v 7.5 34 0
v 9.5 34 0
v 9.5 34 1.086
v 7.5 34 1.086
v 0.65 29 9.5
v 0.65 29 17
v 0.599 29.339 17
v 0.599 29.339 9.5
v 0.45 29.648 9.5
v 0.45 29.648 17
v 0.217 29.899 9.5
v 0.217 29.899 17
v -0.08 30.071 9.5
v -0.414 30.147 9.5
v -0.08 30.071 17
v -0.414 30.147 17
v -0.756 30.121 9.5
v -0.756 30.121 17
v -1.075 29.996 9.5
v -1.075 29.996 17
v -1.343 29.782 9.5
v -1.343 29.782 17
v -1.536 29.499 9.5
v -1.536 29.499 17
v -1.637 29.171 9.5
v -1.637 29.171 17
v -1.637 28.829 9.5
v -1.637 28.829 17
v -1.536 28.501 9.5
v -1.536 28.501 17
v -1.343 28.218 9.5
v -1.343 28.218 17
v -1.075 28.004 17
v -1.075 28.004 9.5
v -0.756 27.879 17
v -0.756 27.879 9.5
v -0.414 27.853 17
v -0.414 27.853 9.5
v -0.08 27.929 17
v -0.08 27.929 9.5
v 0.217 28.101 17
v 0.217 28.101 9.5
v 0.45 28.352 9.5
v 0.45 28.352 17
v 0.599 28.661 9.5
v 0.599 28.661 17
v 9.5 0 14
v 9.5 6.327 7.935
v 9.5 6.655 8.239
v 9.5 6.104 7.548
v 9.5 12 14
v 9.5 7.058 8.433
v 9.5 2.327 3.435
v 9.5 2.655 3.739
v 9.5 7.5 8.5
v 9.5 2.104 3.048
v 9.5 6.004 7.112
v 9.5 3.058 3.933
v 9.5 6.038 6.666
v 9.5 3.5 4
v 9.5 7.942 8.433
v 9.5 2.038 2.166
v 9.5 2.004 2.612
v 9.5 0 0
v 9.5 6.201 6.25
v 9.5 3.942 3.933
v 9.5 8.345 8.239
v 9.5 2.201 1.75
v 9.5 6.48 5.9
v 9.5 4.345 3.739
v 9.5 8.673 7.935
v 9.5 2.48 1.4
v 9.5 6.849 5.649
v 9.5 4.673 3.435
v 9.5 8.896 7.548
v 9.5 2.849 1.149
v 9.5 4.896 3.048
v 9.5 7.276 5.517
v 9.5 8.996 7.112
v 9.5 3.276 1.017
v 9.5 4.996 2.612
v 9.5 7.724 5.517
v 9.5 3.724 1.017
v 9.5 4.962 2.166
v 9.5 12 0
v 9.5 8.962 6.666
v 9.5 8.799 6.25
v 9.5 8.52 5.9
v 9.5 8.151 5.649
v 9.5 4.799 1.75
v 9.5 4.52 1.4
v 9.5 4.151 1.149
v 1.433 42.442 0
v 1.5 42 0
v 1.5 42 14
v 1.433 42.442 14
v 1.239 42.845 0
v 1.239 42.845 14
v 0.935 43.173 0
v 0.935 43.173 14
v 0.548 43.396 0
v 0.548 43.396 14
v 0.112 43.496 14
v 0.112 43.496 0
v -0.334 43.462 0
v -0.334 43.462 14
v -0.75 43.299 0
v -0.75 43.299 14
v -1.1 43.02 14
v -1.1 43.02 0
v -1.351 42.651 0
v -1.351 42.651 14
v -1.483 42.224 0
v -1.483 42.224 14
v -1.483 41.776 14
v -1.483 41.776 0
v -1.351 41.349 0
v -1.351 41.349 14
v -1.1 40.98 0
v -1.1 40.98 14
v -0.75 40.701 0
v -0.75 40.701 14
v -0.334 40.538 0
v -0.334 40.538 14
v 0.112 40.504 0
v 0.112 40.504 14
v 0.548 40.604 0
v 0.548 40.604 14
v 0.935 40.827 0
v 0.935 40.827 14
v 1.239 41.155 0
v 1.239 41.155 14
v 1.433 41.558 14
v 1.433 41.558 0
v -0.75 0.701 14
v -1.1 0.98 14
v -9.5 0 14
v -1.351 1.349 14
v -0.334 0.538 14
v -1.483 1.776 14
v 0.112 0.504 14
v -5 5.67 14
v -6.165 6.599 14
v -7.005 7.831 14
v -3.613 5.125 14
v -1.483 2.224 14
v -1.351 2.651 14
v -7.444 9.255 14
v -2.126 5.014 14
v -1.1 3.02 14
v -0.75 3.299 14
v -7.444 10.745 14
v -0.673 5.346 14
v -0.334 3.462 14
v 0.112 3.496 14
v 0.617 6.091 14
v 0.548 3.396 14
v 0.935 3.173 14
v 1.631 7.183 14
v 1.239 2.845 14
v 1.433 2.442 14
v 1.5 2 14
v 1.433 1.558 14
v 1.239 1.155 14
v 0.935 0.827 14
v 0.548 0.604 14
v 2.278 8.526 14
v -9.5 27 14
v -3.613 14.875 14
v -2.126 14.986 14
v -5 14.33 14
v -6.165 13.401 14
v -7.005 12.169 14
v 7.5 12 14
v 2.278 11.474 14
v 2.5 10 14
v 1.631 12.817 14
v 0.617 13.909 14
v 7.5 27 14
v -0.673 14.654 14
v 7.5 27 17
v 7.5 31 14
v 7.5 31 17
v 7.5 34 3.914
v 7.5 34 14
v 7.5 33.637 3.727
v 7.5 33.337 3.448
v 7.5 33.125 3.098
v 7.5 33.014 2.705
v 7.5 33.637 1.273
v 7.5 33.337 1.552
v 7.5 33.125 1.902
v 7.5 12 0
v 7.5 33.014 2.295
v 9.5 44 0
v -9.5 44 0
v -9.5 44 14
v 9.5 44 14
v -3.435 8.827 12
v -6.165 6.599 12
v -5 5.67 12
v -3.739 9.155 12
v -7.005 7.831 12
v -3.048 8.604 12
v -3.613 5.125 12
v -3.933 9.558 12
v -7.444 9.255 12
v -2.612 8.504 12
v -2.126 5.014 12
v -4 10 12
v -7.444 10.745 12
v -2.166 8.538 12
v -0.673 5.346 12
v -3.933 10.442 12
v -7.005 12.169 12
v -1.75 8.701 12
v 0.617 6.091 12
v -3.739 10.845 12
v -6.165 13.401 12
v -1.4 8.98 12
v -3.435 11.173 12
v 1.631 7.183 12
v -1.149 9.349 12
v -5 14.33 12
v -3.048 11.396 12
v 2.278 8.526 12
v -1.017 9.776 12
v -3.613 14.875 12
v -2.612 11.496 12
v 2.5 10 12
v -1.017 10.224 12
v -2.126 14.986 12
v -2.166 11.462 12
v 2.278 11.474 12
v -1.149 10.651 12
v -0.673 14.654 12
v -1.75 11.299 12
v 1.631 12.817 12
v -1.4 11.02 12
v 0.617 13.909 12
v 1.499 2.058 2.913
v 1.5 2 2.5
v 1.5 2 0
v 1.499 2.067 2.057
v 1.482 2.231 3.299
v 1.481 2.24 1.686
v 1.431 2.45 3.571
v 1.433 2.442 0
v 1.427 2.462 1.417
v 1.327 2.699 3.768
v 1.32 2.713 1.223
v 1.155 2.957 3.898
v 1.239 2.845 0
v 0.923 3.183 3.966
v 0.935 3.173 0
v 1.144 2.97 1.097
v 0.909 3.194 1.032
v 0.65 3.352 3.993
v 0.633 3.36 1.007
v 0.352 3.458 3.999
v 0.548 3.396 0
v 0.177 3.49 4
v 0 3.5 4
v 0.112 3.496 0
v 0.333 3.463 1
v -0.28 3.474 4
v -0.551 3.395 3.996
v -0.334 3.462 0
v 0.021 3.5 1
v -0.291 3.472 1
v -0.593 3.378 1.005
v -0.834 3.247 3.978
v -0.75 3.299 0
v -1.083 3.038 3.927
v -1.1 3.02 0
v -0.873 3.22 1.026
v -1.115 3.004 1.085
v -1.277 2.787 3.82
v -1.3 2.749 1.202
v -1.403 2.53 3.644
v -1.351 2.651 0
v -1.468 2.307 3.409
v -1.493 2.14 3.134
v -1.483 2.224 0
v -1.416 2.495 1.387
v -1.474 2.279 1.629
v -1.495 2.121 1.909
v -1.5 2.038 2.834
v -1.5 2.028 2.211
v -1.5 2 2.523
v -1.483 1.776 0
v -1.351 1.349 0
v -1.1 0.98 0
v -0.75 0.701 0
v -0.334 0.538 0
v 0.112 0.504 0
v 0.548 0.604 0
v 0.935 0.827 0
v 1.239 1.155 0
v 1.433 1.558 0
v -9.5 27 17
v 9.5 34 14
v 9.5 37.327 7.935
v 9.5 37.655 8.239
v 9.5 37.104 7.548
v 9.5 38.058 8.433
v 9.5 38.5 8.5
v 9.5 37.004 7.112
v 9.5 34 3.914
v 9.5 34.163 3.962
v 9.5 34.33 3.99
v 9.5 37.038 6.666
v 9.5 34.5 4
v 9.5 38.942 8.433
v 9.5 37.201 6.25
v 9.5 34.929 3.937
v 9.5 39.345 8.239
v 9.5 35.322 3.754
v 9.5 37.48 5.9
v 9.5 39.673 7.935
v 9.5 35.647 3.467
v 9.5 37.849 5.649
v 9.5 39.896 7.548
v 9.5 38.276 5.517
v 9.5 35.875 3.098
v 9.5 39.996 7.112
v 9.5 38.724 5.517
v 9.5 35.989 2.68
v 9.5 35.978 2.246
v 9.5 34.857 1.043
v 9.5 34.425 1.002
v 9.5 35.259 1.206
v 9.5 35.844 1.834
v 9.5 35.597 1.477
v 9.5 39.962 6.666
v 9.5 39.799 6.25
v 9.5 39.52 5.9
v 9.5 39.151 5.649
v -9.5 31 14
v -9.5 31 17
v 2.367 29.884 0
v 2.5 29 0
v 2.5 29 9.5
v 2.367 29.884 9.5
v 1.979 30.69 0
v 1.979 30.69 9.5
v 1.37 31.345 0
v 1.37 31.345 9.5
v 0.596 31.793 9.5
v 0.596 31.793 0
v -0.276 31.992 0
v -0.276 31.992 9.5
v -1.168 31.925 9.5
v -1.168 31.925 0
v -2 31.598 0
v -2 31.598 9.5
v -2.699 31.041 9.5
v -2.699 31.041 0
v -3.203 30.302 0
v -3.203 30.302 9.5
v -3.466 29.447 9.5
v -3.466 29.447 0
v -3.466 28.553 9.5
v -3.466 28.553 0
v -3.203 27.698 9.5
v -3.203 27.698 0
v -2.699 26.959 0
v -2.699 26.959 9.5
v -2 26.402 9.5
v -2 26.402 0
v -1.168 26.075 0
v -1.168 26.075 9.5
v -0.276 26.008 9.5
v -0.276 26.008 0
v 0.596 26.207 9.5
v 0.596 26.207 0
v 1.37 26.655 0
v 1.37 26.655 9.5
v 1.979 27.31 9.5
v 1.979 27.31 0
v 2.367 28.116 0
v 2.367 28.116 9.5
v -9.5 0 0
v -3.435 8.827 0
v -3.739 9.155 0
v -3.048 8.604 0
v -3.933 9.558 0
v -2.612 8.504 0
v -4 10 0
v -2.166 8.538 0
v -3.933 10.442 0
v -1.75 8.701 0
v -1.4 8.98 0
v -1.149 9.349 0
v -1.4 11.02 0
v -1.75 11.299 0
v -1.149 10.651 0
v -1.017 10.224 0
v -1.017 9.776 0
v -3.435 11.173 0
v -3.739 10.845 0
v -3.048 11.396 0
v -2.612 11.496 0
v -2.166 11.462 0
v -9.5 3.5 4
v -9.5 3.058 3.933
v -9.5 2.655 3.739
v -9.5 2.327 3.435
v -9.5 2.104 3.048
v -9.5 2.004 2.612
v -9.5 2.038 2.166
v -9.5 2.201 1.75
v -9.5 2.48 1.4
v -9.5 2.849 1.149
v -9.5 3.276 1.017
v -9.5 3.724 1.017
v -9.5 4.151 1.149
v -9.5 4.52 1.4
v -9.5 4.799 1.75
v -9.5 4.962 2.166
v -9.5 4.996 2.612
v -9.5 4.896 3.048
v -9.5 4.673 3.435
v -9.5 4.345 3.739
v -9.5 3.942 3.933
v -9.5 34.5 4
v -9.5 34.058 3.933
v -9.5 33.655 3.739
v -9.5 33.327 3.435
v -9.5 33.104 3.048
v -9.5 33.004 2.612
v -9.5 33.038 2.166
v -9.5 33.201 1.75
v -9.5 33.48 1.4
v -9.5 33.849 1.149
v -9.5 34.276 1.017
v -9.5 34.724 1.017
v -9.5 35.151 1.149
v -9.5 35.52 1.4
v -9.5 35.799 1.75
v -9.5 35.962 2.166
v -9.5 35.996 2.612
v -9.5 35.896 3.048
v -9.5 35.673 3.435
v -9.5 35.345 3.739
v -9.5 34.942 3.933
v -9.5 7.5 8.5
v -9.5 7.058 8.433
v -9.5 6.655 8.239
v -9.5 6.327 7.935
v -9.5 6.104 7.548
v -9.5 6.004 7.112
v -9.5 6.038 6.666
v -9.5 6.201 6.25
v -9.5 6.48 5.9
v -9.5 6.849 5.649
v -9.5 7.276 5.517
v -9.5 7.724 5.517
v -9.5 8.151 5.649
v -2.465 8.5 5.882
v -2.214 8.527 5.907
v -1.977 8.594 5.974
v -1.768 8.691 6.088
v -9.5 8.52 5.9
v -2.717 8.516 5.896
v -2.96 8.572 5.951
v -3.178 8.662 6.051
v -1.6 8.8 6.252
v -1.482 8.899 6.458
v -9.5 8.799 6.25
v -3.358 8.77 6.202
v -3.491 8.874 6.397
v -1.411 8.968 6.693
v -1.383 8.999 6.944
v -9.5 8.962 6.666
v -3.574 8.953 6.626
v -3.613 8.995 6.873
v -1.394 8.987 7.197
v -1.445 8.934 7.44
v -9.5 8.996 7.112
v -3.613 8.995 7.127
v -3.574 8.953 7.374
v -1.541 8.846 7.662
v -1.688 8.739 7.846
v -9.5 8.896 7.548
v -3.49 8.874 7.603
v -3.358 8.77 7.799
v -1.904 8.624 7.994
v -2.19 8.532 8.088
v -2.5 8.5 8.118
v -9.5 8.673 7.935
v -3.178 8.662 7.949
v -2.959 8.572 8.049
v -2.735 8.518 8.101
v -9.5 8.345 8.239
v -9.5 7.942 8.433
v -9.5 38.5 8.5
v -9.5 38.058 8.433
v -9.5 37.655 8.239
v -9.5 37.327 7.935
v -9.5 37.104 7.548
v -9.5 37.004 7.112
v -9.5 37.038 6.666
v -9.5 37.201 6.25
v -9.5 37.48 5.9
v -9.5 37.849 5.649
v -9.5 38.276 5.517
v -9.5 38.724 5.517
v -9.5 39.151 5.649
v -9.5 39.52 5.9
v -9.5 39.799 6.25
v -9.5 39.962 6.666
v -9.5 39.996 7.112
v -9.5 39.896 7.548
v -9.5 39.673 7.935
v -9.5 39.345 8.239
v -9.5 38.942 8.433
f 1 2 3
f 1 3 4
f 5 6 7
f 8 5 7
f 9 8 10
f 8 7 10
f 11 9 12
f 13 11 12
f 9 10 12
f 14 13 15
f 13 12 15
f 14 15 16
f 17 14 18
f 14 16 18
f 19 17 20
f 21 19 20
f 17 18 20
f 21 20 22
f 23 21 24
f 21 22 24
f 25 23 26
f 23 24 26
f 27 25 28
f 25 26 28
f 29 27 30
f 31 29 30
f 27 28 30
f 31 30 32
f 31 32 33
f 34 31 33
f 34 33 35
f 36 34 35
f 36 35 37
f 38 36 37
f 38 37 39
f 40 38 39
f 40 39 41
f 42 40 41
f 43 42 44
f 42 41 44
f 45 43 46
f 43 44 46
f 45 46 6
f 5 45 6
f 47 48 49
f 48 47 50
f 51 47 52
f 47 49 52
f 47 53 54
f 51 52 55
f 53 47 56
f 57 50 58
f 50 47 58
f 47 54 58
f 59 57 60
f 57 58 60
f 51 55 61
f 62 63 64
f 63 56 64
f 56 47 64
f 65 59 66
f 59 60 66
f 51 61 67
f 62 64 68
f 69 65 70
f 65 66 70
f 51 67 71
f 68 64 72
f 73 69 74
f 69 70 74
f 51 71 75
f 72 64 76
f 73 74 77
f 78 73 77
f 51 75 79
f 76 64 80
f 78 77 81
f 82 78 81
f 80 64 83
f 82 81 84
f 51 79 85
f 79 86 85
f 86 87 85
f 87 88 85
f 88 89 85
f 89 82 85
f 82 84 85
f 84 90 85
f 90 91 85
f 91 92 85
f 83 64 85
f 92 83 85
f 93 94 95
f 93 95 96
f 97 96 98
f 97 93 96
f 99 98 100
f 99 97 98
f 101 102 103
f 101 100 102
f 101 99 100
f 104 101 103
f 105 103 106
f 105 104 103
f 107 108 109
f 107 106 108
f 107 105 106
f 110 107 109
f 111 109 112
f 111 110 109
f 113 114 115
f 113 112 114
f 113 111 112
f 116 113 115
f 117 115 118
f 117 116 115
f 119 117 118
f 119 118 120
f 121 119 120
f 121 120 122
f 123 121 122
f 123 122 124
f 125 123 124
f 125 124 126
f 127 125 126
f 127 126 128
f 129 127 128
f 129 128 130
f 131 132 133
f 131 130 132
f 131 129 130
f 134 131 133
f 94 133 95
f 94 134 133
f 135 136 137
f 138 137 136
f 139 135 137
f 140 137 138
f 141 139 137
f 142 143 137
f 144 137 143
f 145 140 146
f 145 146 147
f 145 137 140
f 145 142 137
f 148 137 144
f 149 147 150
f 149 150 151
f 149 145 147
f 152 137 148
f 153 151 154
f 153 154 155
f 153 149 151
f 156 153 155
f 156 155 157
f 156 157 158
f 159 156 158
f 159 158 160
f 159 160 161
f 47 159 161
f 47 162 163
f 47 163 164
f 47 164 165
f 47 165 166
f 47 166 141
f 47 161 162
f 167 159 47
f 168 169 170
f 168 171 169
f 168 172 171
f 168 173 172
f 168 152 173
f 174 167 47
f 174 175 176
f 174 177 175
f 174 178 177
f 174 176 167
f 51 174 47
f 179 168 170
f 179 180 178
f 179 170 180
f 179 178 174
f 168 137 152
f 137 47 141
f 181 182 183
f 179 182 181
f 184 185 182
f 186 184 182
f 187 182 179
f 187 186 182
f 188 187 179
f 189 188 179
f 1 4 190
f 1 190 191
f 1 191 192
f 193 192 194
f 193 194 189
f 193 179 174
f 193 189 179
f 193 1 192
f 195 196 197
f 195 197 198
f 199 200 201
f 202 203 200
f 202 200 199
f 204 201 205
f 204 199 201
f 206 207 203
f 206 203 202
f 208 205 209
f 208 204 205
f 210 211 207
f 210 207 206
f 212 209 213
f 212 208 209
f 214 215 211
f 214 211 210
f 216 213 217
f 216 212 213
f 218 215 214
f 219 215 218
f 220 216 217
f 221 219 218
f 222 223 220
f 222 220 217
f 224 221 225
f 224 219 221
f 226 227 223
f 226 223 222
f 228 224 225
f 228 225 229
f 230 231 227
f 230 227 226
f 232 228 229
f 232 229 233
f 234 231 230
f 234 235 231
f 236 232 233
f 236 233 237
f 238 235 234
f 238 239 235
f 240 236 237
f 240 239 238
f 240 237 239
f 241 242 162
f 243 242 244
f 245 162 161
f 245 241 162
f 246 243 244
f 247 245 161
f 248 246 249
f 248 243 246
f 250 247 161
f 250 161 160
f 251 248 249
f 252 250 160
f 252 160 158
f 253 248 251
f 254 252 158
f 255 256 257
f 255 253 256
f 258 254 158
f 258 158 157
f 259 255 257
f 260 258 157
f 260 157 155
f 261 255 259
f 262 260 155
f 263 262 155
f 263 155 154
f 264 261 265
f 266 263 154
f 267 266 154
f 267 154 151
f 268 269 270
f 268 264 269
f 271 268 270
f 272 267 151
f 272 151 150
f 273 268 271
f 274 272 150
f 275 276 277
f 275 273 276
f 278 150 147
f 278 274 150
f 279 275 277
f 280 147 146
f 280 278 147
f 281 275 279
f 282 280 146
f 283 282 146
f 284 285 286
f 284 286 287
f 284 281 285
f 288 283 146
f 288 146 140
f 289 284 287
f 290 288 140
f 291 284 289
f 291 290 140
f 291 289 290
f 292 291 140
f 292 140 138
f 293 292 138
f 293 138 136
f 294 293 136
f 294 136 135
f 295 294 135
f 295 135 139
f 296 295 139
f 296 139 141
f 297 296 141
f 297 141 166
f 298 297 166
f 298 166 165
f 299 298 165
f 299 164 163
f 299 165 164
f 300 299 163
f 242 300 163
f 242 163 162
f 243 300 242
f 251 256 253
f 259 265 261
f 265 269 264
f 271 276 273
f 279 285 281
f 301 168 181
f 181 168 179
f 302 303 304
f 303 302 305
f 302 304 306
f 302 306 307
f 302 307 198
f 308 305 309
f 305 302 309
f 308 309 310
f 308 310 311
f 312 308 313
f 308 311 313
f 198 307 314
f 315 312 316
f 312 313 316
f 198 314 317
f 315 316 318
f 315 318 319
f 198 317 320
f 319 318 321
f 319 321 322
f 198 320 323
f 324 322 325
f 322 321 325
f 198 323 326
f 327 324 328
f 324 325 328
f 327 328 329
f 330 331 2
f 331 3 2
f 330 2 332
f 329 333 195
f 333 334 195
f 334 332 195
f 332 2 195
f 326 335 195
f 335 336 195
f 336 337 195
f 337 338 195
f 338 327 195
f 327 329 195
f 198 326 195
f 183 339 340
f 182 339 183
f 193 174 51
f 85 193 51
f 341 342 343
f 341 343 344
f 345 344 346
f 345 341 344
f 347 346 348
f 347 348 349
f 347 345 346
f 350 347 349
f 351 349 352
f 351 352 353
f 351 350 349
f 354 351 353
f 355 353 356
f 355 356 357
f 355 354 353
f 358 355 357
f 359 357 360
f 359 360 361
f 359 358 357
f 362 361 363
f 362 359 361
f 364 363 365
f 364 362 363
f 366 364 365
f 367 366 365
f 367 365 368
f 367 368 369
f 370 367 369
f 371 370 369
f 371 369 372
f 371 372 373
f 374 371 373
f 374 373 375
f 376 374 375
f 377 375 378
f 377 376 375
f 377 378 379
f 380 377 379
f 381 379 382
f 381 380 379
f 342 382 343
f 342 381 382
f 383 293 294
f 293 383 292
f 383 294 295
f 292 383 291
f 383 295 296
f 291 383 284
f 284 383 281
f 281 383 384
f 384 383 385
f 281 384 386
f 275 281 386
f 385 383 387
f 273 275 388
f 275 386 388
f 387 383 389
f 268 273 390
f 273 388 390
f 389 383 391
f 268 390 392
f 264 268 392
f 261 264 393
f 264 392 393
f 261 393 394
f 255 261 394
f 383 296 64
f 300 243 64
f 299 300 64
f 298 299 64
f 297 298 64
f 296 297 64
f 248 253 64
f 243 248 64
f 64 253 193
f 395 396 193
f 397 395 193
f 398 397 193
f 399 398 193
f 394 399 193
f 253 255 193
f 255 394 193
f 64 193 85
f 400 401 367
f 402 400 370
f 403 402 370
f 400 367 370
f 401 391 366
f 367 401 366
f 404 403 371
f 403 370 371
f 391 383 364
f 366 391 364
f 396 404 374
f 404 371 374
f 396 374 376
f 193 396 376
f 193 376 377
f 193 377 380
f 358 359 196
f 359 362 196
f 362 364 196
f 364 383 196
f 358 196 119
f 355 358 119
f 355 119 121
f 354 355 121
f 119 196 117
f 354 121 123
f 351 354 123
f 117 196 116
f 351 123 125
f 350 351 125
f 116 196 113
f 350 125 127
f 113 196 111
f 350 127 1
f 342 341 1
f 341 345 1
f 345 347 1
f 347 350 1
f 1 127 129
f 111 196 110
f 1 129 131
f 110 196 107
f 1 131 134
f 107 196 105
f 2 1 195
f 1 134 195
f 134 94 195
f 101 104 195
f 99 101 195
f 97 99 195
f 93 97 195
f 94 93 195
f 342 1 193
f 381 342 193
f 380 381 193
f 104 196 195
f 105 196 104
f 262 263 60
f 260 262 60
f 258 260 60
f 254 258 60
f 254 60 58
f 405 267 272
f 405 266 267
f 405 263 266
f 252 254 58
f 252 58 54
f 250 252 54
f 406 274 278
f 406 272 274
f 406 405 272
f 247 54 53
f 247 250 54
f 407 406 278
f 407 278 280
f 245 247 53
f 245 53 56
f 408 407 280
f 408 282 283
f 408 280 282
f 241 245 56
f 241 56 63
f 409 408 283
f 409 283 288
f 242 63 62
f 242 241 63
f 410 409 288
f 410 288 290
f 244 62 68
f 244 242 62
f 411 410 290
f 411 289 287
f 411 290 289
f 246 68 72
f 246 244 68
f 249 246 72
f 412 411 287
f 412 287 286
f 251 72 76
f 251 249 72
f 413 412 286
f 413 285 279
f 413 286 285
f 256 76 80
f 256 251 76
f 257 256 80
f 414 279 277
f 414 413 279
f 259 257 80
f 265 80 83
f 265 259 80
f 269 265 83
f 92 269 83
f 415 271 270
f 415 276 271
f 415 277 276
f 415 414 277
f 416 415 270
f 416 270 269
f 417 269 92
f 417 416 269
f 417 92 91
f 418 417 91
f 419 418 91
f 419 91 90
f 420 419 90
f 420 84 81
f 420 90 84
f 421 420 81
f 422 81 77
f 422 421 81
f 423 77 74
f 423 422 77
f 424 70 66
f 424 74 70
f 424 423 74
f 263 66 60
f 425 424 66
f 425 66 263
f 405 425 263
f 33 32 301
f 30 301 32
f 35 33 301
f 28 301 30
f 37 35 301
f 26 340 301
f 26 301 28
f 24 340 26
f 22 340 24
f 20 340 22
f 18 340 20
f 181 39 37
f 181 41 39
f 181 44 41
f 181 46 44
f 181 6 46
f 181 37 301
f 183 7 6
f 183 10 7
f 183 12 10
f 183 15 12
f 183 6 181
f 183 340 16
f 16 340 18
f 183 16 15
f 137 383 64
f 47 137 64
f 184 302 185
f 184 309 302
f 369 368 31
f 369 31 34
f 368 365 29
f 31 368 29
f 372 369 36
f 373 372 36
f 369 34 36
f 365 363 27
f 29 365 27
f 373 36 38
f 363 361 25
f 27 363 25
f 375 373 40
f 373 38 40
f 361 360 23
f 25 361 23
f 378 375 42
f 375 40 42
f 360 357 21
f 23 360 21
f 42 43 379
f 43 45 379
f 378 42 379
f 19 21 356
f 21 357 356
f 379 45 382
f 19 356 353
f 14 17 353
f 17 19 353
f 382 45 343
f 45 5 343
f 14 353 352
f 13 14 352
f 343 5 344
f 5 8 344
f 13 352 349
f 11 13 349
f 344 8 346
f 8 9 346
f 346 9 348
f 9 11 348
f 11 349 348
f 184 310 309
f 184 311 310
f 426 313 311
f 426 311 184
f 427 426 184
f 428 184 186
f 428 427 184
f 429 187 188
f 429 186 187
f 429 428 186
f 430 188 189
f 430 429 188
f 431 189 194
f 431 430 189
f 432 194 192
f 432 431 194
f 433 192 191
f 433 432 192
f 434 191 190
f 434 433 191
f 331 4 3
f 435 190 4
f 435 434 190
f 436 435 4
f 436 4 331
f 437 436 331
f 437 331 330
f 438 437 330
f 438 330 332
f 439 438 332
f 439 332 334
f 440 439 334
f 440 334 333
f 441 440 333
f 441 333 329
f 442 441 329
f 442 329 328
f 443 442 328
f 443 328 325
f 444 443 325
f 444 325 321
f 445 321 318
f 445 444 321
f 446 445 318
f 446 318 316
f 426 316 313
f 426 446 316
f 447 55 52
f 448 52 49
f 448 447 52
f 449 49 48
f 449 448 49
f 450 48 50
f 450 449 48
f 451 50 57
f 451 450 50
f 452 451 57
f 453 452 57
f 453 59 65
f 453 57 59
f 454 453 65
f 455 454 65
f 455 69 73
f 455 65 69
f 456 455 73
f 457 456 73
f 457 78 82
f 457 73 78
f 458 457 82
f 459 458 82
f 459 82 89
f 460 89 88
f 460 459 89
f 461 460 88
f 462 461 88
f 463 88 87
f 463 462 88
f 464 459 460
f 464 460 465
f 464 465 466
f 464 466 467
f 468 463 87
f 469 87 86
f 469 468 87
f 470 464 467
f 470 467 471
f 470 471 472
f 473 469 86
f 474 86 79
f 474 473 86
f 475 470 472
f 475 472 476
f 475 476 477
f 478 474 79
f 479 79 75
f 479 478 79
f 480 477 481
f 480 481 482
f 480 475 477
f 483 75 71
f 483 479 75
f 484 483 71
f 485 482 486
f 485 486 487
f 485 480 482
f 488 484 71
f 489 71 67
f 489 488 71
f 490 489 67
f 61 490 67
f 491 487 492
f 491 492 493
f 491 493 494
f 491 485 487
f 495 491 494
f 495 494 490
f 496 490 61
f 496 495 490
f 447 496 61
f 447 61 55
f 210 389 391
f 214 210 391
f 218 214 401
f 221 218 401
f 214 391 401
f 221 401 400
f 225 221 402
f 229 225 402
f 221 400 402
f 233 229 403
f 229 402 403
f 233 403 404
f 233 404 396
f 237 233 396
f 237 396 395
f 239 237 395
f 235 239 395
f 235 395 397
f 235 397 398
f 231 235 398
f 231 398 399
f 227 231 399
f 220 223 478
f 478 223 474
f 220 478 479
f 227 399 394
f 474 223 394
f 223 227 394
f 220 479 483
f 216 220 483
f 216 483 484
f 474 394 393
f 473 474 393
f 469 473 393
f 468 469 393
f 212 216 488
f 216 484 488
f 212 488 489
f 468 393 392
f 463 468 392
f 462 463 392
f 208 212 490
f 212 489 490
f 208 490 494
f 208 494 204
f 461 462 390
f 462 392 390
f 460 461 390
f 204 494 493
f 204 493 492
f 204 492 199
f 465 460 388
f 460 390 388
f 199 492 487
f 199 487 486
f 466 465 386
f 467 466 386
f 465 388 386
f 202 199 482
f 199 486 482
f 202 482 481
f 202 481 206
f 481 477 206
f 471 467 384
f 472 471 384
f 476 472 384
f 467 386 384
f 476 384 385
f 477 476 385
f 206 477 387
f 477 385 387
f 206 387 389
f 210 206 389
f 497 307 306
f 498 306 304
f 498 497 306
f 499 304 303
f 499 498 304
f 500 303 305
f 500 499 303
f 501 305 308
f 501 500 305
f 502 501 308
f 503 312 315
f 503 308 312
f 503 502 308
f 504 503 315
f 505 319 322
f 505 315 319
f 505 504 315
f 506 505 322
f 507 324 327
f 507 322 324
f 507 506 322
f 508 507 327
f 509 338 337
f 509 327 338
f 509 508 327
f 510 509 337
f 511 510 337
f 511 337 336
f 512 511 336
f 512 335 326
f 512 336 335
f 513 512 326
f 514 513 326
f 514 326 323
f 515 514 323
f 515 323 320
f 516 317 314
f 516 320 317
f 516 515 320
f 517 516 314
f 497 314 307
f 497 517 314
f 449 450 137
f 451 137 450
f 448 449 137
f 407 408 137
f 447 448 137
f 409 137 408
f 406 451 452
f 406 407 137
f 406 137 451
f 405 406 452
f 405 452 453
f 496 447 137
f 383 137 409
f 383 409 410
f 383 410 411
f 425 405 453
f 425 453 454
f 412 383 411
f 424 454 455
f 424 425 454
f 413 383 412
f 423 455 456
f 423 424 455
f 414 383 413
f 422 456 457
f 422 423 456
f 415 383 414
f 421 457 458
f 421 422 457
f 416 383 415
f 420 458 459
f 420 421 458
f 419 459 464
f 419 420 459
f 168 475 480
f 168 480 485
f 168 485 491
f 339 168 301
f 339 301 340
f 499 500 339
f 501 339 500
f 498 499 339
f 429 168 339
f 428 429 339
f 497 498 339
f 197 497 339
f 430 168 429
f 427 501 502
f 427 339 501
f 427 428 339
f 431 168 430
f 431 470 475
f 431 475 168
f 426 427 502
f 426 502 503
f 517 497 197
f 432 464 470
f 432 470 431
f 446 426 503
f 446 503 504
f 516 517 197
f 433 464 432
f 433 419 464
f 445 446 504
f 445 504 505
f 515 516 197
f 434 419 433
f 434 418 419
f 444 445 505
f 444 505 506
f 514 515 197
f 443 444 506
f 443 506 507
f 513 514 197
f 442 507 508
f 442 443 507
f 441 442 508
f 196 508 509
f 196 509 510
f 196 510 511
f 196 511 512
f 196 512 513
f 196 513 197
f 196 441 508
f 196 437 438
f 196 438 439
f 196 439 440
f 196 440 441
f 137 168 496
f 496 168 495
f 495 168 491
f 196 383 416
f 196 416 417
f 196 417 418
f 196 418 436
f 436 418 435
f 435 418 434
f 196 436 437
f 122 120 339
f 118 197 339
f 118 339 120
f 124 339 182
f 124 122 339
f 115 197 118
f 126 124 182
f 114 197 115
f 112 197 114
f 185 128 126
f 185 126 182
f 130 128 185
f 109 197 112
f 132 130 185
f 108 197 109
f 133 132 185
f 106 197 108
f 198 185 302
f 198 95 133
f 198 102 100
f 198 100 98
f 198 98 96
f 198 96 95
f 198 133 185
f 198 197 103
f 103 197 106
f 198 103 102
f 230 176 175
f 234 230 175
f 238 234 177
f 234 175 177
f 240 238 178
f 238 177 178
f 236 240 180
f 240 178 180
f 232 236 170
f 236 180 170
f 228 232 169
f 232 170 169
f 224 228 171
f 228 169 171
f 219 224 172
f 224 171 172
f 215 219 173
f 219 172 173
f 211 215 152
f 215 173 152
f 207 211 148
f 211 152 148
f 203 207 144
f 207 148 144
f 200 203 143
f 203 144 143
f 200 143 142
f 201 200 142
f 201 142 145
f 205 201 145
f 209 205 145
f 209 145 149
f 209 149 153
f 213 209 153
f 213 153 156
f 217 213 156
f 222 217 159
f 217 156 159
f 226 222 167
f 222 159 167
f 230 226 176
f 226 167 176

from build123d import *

# Parameters (mm, degrees)
SKETCH1_W               = 19
SKETCH1_H               = 44
BOSS_EXTRUDE1_DEPTH     = 14
CUT_EXTRUDE1_DEPTH      = 48.140746706
CUT_EXTRUDE1_DEPTH_BACK = 48.140746706
SKETCH2_R               = 1.5
CUT_EXTRUDE2_START      = -9.5
SKETCH3_R               = 1.5
CUT_EXTRUDE2_DEPTH      = 20
BOSS_EXTRUDE2_START     = 14
SKETCH4_W               = 19
SKETCH4_H               = 4
BOSS_EXTRUDE2_DEPTH     = 3
CUT_EXTRUDE3_START      = 17
SKETCH5_R               = 1.15
CUT_EXTRUDE3_DEPTH      = 7.5
SKETCH6_R               = 3
CUT_EXTRUDE4_DEPTH      = 9.5
CUT_EXTRUDE5_DEPTH      = 49.117044817
CUT_EXTRUDE5_DEPTH_BACK = 49.117044817
SKETCH8_R               = 1.5
CUT_EXTRUDE6_DEPTH      = 36
SKETCH9_R               = 5
CUT_EXTRUDE7_DEPTH      = 2


with BuildPart() as part:
    # Sketch1 → Boss-Extrude1 (new body)
    with BuildSketch(Plane.XY):
        with Locations((0, 22)):
            Rectangle(SKETCH1_W, SKETCH1_H)
    extrude(amount=BOSS_EXTRUDE1_DEPTH)

    # Sketch2 → Cut-Extrude1 (cut, two sides: drawn at the far end of the back side and taken through both)
    with BuildSketch(Plane.XY.offset(-CUT_EXTRUDE1_DEPTH_BACK)):
        with Locations((0, 2)):
            Circle(SKETCH2_R)
        with Locations((0, 42)):
            Circle(SKETCH2_R)
    extrude(amount=CUT_EXTRUDE1_DEPTH + CUT_EXTRUDE1_DEPTH_BACK, mode=Mode.SUBTRACT)

    # Sketch3 → Cut-Extrude2 (cut)
    with BuildSketch(Plane(origin=(0, 0, 0), x_dir=(0, 0, -1), z_dir=(1, 0, 0)).offset(CUT_EXTRUDE2_START)):
        with Locations(Location((-7, 7.5, 0), (0, 0, 180))):
            Circle(SKETCH3_R)
        with Locations(Location((-7, 38.5, 0), (0, 0, 180))):
            Circle(SKETCH3_R)
        with Locations(Location((-2.5, 3.5, 0), (0, 0, 180))):
            Circle(SKETCH3_R)
        with Locations(Location((-2.5, 34.5, 0), (0, 0, 180))):
            Circle(SKETCH3_R)
    extrude(amount=CUT_EXTRUDE2_DEPTH, mode=Mode.SUBTRACT)

    # Sketch4 → Boss-Extrude2 (add)
    with BuildSketch(Plane.XY.offset(BOSS_EXTRUDE2_START)):
        with Locations((0, 29)):
            Rectangle(SKETCH4_W, SKETCH4_H)
    extrude(amount=BOSS_EXTRUDE2_DEPTH)

    # Sketch5 → Cut-Extrude3 (cut)
    with BuildSketch(Plane.XY.offset(CUT_EXTRUDE3_START)):
        with Locations((-0.5, 29)):
            Circle(SKETCH5_R)
    extrude(amount=-CUT_EXTRUDE3_DEPTH, mode=Mode.SUBTRACT)

    # Sketch6 → Cut-Extrude4 (cut)
    with BuildSketch(Plane.XY):
        with Locations((-0.5, 29)):
            Circle(SKETCH6_R)
    extrude(amount=CUT_EXTRUDE4_DEPTH, mode=Mode.SUBTRACT)

    # Sketch7 → Cut-Extrude5 (cut, two sides: drawn at the far end of the back side and taken through both)
    with BuildSketch(Plane.XY.offset(-CUT_EXTRUDE5_DEPTH_BACK)):
        Polygon((97.397368474, 34), (9.5, 34), (7.5, 34), (7.5, 12), (9.5, 12), (97.397368474, 12), (273.192105422, 12), (273.192105422, 34), align=None)
    extrude(amount=CUT_EXTRUDE5_DEPTH + CUT_EXTRUDE5_DEPTH_BACK, mode=Mode.SUBTRACT)

    # Sketch8 → Cut-Extrude6 (cut)
    with BuildSketch(Plane(origin=(0, 0, 0), x_dir=(-1, 0, 0), z_dir=(0, 0, -1))):
        with Locations((2.5, 10)):
            Circle(SKETCH8_R)
    extrude(amount=-CUT_EXTRUDE6_DEPTH, mode=Mode.SUBTRACT)

    # Sketch9 → Cut-Extrude7 (cut)
    with BuildSketch(Plane.XY.offset(14)):
        with Locations((-2.5, 10)):
            Circle(SKETCH9_R)
    extrude(amount=-CUT_EXTRUDE7_DEPTH, mode=Mode.SUBTRACT)


solid = part.part
